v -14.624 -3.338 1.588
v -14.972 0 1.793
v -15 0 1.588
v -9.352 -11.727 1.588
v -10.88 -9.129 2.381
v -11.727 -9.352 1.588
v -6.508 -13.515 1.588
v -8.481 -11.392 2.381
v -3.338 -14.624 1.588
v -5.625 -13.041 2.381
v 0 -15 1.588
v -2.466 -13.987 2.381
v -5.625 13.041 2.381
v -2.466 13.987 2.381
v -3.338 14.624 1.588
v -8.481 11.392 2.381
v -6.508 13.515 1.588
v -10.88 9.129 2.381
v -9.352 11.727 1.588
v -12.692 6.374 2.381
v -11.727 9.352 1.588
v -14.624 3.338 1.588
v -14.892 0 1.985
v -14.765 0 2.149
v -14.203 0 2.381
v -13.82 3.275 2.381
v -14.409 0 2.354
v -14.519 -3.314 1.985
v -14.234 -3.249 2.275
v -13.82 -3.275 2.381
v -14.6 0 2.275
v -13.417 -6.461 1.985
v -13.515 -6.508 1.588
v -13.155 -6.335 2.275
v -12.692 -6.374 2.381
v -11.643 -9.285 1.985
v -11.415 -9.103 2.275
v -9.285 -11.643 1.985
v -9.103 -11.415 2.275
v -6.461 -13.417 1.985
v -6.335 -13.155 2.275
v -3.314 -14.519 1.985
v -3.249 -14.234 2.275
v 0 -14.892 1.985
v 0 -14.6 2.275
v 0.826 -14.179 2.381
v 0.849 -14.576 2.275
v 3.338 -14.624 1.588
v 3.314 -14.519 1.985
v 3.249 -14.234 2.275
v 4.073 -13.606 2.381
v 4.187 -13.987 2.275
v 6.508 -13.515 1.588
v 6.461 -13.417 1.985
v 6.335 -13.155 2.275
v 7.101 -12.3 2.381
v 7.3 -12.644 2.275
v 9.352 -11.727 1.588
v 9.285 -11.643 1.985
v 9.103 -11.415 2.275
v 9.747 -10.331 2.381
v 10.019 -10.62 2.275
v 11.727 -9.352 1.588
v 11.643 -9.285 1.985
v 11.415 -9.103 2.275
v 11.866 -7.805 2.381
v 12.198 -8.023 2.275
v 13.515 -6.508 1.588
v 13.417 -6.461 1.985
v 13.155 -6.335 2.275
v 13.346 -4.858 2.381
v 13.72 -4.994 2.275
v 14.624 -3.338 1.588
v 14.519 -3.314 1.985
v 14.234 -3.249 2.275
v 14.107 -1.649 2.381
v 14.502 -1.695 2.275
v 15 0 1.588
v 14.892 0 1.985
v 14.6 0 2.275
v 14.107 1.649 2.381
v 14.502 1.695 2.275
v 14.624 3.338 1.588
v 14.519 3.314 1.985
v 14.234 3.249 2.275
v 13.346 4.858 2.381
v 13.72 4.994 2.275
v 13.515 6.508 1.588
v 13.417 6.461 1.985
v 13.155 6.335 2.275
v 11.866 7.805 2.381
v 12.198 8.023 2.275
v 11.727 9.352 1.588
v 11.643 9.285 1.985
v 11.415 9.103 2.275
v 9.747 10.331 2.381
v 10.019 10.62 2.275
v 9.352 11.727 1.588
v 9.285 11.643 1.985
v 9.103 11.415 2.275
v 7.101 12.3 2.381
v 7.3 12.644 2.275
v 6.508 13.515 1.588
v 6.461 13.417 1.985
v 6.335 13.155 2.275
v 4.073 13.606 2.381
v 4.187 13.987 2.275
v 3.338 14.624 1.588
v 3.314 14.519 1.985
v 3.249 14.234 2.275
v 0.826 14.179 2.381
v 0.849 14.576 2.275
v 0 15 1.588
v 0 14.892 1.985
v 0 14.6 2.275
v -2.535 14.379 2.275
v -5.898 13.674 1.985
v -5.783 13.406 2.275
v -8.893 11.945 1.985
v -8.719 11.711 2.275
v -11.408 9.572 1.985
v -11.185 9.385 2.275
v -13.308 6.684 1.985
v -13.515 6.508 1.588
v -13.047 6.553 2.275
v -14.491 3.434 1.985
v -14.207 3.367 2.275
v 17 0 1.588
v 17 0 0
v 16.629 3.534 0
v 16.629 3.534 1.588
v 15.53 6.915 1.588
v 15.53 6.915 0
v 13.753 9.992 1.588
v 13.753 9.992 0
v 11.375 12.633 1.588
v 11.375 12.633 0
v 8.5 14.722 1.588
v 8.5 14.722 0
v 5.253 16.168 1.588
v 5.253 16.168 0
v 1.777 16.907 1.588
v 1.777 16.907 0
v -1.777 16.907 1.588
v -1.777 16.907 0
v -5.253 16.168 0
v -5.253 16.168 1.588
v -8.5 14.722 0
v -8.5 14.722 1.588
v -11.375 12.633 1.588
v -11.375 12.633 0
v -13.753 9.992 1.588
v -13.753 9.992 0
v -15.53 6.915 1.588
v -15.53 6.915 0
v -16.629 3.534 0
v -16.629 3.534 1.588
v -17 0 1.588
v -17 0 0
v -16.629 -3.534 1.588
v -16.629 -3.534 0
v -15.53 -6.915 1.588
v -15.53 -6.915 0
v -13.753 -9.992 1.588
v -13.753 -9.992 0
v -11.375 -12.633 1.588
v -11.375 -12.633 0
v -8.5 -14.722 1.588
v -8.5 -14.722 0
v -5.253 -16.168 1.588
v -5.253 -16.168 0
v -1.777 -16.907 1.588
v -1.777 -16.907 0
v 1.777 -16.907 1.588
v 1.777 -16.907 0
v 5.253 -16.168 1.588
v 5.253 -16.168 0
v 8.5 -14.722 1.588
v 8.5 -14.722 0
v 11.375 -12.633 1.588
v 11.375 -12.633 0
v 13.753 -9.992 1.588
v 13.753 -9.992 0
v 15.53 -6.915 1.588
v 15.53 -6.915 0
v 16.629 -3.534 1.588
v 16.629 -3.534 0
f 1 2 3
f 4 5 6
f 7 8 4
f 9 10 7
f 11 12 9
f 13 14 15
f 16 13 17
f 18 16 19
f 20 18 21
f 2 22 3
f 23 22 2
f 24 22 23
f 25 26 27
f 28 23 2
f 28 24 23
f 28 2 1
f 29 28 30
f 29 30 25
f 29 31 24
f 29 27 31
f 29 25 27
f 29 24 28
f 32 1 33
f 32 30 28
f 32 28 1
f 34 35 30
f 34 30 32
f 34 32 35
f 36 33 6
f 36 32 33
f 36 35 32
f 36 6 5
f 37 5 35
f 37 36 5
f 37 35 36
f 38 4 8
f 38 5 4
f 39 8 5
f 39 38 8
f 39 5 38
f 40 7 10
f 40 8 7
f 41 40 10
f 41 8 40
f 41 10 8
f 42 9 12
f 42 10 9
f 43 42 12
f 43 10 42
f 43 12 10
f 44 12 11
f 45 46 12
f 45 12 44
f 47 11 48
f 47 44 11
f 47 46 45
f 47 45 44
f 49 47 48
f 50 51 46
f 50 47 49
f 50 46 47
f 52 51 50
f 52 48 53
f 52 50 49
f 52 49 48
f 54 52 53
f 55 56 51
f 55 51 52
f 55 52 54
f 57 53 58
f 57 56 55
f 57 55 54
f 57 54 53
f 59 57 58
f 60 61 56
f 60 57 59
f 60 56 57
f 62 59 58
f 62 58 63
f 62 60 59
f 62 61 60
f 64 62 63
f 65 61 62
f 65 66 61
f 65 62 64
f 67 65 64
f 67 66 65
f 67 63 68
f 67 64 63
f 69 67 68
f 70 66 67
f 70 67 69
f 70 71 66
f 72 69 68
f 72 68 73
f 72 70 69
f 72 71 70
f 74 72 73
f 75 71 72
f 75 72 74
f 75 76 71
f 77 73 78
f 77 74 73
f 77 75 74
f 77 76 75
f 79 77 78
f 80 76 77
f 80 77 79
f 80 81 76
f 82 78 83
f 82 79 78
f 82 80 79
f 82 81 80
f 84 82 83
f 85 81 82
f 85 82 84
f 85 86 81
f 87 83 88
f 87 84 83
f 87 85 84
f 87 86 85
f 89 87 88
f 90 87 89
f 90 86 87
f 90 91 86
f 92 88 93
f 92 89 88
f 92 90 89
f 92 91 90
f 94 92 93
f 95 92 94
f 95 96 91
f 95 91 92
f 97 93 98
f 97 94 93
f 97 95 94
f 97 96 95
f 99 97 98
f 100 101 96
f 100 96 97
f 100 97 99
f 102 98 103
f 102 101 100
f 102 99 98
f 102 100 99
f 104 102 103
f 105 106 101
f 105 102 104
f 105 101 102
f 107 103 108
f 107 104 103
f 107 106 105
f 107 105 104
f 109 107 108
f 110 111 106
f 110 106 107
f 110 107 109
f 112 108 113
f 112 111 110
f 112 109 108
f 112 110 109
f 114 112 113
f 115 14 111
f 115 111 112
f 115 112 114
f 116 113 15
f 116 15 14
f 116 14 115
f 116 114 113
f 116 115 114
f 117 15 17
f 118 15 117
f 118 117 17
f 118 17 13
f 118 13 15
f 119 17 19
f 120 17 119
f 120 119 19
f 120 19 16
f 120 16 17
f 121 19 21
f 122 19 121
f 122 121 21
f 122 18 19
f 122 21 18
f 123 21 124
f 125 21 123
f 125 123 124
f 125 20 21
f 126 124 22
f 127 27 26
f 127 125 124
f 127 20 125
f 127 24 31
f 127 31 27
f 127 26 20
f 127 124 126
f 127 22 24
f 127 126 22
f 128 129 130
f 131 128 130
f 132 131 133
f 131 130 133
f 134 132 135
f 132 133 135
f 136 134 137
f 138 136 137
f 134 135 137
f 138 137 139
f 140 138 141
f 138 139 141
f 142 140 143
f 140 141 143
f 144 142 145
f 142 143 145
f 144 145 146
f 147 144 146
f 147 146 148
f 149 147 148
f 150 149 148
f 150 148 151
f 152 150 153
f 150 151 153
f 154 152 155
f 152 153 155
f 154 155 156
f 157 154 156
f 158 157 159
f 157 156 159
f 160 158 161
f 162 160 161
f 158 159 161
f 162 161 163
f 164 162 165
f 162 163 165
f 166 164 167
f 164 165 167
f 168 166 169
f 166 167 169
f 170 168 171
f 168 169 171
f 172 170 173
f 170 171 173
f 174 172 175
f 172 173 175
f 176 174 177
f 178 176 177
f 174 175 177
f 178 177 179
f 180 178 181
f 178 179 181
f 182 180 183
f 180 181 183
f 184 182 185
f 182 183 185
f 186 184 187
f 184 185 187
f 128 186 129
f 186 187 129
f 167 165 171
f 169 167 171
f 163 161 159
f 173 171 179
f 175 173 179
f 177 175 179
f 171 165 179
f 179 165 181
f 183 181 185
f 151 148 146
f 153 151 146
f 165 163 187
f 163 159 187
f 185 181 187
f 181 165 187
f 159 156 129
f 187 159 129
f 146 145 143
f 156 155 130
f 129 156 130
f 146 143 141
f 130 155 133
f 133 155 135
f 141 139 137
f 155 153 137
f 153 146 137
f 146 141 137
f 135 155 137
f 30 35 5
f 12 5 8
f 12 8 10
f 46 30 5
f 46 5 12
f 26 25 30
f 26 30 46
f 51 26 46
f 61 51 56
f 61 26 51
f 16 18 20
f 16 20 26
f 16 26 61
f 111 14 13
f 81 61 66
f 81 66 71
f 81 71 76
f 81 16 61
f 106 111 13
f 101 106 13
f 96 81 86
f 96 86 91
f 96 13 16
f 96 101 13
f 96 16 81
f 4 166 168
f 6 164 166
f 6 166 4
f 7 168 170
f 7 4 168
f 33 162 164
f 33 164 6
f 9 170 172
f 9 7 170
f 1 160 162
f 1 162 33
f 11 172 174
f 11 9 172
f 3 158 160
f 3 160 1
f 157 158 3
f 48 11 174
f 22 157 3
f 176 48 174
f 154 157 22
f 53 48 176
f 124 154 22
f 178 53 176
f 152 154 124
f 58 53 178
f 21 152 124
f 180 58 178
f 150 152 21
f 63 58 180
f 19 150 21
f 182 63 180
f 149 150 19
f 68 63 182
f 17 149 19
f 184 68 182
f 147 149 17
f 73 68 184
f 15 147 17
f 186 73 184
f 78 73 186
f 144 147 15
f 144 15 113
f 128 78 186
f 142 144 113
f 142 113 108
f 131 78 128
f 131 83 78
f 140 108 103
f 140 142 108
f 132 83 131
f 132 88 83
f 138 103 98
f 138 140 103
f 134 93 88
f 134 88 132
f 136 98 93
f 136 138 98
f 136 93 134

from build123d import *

# Parameters (mm, degrees)
F3_DEPTH = 2.38125
F4_DEPTH = 1.5875


# Not quite as in the source:
# - a fillet or chamfer that OpenCascade refuses, or shapes differently, is made with other operations: its cross-section is extruded or revolved along the edge and cut away or added


with BuildPart() as f3:
    # F2 (on Top) → F3 (new body)
    with BuildSketch(Plane.XY):
        with BuildLine():
            Line((-15, 0), (15, 0))
            ThreePointArc((15, 0), (0, 15), (-15, 0))
        make_face()
        with BuildLine():
            ThreePointArc((-15, 0), (0, -15), (15, 0))
            Line((15, 0), (-15, 0))
        make_face()
    extrude(amount=F3_DEPTH)

    # F2 (on Top) → F4 (join)
    with BuildSketch(Plane.XY):
        with BuildLine():
            Line((17, 0), (15, 0))
            ThreePointArc((15, 0), (0, -15), (-15, 0))
            Line((-15, 0), (-17, 0))
            ThreePointArc((-17, 0), (0, -17), (17, 0))
        make_face()
        with BuildLine():
            ThreePointArc((-15, 0), (0, 15), (15, 0))
            Line((15, 0), (17, 0))
            ThreePointArc((17, 0), (0, 17), (-17, 0))
            Line((-17, 0), (-15, 0))
        make_face()
    extrude(amount=F4_DEPTH)

    # F5: fillet of radius 0.7971733183 on 1 edges, made by hand


with BuildPart() as f5_tool2:
    # F5_s3 → F5_t4 (revolve)
    with BuildSketch(Plane.XZ):
        with BuildLine():
            ThreePointArc((-15, 1.5840766817), (-14.7665133409, 2.1477633409), (-14.2028266817, 2.38125))
            Line((-14.2028266817, 2.38125), (-15, 2.38125))
            Line((-15, 2.38125), (-15, 1.5840766817))
        make_face()
    revolve(axis=Axis((0, 0, 2.38125), (0, 0, 1)))

    split(bisect_by=Plane.XY.offset(1.5875), keep=Keep.TOP)


with BuildPart() as f3_1:
    add(f3.part)

    # F5_t1: cut F5_tool2
    add(f5_tool2.part, mode=Mode.SUBTRACT)


solid = f3_1.part
